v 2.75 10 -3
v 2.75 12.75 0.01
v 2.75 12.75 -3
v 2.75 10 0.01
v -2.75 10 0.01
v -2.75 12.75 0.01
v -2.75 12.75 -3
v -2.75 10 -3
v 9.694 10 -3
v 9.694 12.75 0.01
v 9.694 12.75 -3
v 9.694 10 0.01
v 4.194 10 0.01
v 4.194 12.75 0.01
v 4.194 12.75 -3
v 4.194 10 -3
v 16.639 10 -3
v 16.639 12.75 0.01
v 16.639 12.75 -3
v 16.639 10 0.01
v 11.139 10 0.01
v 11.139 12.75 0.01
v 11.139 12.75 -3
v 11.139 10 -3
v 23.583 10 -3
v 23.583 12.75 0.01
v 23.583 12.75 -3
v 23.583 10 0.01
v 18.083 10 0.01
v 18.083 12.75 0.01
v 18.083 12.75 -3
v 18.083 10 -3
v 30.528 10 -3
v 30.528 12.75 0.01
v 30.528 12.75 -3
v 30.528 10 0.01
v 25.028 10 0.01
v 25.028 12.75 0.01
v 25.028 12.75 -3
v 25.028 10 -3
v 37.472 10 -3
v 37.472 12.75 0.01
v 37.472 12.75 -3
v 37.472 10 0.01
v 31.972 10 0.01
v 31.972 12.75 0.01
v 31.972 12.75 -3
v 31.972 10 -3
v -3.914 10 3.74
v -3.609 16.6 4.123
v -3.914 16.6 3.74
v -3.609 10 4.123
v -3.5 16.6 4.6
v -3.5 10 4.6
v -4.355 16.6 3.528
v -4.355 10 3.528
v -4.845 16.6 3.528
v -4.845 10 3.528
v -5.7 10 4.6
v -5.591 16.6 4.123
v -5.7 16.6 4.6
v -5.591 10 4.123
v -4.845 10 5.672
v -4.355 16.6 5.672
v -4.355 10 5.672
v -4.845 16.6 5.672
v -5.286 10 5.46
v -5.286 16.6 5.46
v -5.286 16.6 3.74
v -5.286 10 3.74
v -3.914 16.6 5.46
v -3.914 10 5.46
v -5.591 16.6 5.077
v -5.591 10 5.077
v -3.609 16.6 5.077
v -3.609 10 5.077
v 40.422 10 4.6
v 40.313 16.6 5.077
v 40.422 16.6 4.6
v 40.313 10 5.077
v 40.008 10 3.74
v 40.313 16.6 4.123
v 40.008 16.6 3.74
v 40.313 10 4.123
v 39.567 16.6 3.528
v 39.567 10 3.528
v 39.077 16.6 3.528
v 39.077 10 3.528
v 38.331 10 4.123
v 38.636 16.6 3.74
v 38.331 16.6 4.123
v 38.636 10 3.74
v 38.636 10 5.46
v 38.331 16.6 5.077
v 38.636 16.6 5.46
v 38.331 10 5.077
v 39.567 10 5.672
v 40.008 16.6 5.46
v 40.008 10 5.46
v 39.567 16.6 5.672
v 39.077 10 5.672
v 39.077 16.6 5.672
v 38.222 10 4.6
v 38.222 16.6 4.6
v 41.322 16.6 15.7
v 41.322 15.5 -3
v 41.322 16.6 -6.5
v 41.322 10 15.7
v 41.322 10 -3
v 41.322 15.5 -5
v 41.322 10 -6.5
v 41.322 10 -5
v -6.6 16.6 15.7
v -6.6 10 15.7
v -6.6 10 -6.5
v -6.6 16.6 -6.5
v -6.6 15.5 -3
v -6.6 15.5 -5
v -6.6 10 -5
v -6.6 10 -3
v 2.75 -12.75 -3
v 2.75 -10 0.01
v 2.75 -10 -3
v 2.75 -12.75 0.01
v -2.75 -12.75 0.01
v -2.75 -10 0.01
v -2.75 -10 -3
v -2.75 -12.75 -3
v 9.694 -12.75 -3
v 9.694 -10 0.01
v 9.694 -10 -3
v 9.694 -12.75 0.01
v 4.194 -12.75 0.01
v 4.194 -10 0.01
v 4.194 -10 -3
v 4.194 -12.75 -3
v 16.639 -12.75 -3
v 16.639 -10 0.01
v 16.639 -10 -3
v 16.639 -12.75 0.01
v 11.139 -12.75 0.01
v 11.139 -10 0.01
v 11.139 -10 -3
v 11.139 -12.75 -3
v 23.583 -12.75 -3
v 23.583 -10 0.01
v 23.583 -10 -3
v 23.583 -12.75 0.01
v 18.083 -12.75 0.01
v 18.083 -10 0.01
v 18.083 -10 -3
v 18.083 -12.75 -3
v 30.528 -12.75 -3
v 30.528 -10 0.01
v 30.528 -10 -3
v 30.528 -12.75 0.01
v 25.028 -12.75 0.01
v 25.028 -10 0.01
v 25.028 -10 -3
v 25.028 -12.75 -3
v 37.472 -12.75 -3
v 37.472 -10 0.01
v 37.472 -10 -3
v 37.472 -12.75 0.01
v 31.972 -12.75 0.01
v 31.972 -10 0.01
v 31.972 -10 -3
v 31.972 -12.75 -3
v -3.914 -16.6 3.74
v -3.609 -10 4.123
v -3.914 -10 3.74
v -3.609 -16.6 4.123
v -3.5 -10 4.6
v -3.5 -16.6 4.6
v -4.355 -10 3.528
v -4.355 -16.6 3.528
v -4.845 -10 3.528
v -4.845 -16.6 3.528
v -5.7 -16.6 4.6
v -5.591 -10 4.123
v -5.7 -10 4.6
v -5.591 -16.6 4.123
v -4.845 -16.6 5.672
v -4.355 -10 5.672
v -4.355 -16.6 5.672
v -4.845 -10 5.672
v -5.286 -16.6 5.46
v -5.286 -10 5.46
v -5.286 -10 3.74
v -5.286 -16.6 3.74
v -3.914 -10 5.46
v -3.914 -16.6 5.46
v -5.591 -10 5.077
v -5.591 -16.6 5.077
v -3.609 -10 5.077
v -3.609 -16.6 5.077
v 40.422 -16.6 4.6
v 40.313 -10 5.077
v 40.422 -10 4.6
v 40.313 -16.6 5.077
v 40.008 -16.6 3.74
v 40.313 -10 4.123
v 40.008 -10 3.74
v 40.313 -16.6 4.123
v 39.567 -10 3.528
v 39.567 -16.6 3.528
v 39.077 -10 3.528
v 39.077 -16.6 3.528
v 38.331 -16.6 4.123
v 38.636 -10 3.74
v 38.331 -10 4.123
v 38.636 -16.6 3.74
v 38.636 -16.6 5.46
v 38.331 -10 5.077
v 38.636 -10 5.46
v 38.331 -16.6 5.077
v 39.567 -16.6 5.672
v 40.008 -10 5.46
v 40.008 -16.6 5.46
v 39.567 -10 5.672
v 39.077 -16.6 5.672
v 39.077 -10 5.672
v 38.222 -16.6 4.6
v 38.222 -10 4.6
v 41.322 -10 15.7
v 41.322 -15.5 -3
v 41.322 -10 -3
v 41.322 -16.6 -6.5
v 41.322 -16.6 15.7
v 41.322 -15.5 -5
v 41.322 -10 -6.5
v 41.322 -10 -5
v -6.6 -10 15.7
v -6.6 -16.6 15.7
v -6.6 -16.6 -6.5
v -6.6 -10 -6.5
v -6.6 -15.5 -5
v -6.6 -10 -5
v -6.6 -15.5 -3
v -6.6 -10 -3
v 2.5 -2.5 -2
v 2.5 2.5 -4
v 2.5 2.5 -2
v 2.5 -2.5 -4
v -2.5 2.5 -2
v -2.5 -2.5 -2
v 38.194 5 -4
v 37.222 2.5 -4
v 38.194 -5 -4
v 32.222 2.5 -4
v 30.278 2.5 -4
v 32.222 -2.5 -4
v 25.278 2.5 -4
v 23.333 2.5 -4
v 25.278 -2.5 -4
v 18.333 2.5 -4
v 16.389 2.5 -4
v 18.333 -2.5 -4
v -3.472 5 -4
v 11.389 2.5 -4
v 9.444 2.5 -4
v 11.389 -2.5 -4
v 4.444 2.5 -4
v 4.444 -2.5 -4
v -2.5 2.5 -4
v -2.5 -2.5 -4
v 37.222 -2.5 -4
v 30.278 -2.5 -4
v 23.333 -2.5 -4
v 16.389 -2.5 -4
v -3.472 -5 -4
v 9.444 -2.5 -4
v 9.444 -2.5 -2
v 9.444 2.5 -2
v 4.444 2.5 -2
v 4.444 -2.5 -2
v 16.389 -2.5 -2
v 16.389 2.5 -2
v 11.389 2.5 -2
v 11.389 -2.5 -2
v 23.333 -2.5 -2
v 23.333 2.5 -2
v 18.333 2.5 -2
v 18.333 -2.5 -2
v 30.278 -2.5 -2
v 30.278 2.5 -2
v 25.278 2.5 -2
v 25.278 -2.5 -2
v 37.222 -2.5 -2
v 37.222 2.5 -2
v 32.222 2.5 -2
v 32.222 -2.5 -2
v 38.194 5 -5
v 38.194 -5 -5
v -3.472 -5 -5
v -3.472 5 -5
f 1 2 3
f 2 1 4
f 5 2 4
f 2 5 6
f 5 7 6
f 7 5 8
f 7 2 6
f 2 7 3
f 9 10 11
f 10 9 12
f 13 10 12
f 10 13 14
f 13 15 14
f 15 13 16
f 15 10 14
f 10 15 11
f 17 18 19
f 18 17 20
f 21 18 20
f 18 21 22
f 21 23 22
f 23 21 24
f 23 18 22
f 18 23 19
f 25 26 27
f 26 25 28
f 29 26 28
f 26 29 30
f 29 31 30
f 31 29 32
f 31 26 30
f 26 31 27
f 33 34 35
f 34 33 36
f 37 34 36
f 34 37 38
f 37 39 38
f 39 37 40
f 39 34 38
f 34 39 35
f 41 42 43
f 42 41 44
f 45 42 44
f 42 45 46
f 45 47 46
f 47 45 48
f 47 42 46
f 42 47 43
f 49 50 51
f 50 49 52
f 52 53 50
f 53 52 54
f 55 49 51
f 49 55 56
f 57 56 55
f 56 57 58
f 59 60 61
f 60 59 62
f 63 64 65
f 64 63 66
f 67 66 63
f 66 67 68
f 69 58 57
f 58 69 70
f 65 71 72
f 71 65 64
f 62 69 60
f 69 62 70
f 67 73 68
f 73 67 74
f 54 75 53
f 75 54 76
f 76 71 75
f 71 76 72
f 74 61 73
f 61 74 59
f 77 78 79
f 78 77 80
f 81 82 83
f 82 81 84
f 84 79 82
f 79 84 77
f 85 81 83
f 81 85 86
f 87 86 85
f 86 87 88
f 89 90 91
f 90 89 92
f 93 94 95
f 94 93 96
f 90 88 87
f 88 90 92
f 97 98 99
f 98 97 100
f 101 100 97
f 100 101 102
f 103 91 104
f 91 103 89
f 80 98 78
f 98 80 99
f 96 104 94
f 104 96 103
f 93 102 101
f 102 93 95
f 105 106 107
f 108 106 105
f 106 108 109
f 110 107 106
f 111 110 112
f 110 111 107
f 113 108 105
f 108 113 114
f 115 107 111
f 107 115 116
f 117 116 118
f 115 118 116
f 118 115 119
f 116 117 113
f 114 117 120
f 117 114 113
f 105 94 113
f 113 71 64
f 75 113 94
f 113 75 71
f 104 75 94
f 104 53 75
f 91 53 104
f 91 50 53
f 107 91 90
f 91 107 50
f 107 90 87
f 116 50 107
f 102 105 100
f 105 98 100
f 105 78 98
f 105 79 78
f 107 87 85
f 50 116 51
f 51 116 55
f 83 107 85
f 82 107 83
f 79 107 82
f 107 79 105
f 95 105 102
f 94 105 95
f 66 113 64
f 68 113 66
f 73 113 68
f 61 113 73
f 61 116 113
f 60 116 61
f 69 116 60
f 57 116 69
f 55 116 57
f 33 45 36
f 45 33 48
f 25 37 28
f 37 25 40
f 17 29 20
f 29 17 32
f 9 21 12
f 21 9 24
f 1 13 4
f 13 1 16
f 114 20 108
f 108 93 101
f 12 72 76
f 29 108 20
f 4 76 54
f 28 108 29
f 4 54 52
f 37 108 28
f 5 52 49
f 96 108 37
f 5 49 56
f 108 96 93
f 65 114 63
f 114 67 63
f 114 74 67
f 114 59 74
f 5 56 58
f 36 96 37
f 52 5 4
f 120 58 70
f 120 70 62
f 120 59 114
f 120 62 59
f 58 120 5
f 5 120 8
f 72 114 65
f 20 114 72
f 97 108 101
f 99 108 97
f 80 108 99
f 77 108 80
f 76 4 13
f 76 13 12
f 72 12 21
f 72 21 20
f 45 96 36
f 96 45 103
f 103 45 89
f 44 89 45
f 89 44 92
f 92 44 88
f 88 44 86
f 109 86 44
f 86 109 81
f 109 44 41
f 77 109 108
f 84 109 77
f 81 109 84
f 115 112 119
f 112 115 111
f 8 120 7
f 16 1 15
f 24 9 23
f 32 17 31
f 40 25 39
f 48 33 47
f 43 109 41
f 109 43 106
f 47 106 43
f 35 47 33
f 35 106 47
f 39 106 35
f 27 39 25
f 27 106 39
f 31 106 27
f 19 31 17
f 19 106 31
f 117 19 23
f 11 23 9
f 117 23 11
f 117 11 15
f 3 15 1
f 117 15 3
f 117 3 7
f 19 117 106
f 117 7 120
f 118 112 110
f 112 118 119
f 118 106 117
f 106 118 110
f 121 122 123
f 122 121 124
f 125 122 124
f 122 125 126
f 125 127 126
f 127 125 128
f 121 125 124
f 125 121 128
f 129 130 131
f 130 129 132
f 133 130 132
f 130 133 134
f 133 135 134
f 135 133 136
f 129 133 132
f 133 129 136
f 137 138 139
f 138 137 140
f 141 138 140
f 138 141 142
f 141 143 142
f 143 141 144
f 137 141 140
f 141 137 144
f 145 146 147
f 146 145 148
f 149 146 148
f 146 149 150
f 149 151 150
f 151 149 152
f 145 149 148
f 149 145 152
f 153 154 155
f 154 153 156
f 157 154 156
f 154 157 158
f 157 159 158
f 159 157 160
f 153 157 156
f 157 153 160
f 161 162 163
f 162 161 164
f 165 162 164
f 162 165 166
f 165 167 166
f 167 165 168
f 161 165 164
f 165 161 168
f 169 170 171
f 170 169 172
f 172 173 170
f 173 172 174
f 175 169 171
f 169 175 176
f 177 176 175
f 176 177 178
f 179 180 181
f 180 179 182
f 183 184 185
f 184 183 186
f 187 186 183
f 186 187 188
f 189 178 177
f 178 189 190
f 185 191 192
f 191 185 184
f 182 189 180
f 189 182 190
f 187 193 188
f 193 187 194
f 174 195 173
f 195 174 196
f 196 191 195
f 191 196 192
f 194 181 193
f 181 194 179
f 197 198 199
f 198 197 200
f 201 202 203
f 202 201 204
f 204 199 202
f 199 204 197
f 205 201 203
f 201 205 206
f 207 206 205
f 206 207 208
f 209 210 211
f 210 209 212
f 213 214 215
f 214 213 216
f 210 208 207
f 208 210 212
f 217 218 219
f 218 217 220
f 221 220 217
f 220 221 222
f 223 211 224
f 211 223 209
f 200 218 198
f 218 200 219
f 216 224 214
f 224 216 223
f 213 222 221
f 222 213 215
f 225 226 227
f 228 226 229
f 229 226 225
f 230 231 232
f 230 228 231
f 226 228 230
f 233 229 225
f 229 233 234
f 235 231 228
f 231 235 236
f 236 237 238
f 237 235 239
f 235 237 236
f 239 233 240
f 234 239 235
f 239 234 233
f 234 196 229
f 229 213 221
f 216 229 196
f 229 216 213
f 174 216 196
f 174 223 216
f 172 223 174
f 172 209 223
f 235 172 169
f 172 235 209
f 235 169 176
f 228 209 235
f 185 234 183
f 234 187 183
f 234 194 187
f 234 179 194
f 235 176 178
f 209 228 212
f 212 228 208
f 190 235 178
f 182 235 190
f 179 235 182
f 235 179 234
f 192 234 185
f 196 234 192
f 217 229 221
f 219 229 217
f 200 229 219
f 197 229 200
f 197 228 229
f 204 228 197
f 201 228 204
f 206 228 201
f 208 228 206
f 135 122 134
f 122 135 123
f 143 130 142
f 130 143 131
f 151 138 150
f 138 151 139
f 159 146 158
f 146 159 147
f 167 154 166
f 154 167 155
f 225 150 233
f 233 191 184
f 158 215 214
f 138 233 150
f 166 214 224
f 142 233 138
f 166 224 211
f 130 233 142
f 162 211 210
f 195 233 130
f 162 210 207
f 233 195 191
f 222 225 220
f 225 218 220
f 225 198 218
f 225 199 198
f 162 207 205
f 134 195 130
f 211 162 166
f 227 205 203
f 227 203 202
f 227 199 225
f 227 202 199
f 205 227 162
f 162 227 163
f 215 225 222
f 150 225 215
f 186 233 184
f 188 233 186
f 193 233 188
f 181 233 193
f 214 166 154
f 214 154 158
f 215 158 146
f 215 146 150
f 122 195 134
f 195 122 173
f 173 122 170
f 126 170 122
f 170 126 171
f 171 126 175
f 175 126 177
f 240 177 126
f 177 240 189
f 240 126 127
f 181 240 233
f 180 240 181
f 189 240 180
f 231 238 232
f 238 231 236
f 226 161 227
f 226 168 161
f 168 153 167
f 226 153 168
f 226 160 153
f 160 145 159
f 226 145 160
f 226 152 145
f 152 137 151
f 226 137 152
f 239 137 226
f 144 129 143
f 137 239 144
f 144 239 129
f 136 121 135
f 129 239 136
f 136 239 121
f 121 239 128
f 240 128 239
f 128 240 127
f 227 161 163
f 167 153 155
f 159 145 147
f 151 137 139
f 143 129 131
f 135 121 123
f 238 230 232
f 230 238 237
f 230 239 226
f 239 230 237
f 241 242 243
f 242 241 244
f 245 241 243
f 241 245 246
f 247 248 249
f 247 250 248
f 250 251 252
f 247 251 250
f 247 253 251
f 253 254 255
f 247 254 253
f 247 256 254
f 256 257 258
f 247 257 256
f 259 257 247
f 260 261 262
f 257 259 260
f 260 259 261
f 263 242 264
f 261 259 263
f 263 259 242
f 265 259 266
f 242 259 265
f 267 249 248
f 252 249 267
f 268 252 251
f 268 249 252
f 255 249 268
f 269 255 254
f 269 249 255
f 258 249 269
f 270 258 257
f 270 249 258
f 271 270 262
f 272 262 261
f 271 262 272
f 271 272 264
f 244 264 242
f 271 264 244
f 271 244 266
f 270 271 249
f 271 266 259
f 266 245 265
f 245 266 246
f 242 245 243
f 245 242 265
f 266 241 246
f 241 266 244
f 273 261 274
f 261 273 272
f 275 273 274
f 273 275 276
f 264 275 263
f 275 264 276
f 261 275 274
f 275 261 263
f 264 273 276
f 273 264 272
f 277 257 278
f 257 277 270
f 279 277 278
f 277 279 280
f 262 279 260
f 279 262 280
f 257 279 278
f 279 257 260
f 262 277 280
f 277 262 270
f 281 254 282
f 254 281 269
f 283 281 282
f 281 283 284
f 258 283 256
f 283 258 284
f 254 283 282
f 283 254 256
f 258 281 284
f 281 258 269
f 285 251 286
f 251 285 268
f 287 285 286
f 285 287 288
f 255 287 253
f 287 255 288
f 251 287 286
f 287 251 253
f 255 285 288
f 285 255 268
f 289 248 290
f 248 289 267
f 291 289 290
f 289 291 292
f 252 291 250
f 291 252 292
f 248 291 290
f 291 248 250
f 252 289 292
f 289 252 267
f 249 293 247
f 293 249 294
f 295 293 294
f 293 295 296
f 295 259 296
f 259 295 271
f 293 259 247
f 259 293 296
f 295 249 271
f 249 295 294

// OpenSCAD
// file: rgb_strip_to_fiber.scad
led_size = 5;
led_strip_width = 10;
led_strip_thickness = 2;

ferrule_dia = 6;
ferrule_depth = 12;
ferrule_insulation_dia = 10;
ferrule_insulation_height = 10;
ferrule_lip = [0.5, 1]; // ferrule wall thickness is 0.2

registration_block_size = [10, 10, 14];
registration_block_lip = 2;
led_register_lip = 4;
block_to_led = 5;

part_spacing = 0.2;
wall_thickness = 1.5;

m2_hole_size = 2.2;
m3_hole_size = 3.3;


$fa=0.5;
$fs=0.5;

ferrules = [
  [2.5, 8, "1"],
  [3.4, 12, "2-3"],
  [4, 12, "4-5"],
  [4.7, 12, "6-7"]
];


smidge = 0.01;

module mockup(count, leds_per_meter=60, holes="inner", explode=0, half=false, blocks=true) {
  led_stride = 1000/leds_per_meter;

  translate([0, explode * 10, 0])
    strip_base(count, leds_per_meter, holes=holes, blocks=blocks);
  if (!half)
    translate([0, explode * -10, 0])
      mirror([0, 1, 0])
        strip_base(count, leds_per_meter, holes=holes, blocks=blocks);

    translate([0, 0, -block_to_led])
      led_strip(count, leds_per_meter);

  if (blocks) {
        translate([0 * led_stride, 0, 0])
          for (x = [0, half ? 0 : 1])
            rotate([0, 0, 90 + 180 * x])
              translate([0, max(0, explode * 5 - 2.5), 0])
                registration_block_awg_10(registration_block_size);

        translate([1 * led_stride, 0, 0])
          for (x = [0, half ? 0 : 1])
            rotate([0, 0, 90 + 180 * x])
              translate([0, max(0, explode * 5 - 2.5), 0])
                registration_block_awg_12(registration_block_size);

        translate([2 * led_stride, 0, 0])
          for (x = [0, half ? 0 : 1])
            rotate([0, 0, 90 + 180 * x])
              translate([0, max(0, explode * 5 - 2.5), 0])
                registration_block_awg_14(registration_block_size);
  }
}

module strip_base_with_fiber_cutouts(count, leds_per_meter=60, ferrule=0) {
  led_stride = 1000/leds_per_meter;

  difference() {
    strip_base(count, leds_per_meter=leds_per_meter, holes="outer", blocks=false);
    for (i = [0 : count - 1])
      translate([i * led_stride, 0, 0])
        ferrule_cutout(20, ferrule[0], ferrule[1]);
  }
}

module strip_base(count, leds_per_meter=60, holes="inner", blocks=true) {
  led_stride = 1000/leds_per_meter;
  registration_block_cutout = [registration_block_size.y + part_spacing,
                               registration_block_size.x + part_spacing,
                               registration_block_size.z + part_spacing];
  side_inset = 10;
  led_strip_cutout = led_strip_width + 1;

  housing_size = [(count -1) * led_stride + registration_block_cutout.x + wall_thickness * 2,
                  registration_block_cutout.y/2 + wall_thickness,
                  registration_block_cutout.z + wall_thickness * 2 + block_to_led];

  led_cutout = 5.5;
  fiber_cutout = registration_block_size.x - registration_block_lip;

  difference() {
    translate([-registration_block_cutout.x/2 - wall_thickness,
               0,
               -wall_thickness - block_to_led])
      cube(housing_size);

    for (i = [0 : count - 1])
      translate([i * led_stride, 0, 0]) {
        if (blocks) {
          registration_block_base(registration_block_cutout);
          translate([-fiber_cutout/2,
                     -fiber_cutout/2,
                     registration_block_cutout.z - smidge])
            cube([fiber_cutout, fiber_cutout, wall_thickness + smidge * 2]);
        }
        translate([-led_cutout/2,-led_cutout/2, -block_to_led + smidge])
          cube([led_cutout, led_cutout, block_to_led]);
      }

    translate([-registration_block_cutout.x/2 - wall_thickness - smidge,
               -led_strip_cutout/2,
               -block_to_led -0])
      cube([housing_size.x + smidge * 2, led_strip_cutout, led_strip_thickness]);

    if (holes == "inner")
      for (i = [0 : count - 2])
        translate([i * led_stride + led_stride/2,
                   -smidge,
                   registration_block_cutout.z/2]) {
          rotate([-90, 0, 0])
            cylinder(d=m3_hole_size, h=housing_size.y + smidge * 2);
        }
    if (holes == "outer")
      translate([-registration_block_cutout.x/2 - wall_thickness,
                 0,
                 -wall_thickness - block_to_led + housing_size.z/2])
      for (x = [2, housing_size.x - 2])
        translate([x, -smidge, 0])
            rotate([-90, 0, 0])
              cylinder(d=m2_hole_size, h=housing_size.y + smidge * 2);

  }
}


// max 1 1mm fibers
module registration_block_awg_18(block_size=registration_block_size) {
  block = ferrules[0];
  registration_block(block_size, block[0], block[1], block[2]);
}

// max 3 1mm fibers
module registration_block_awg_14(block_size=registration_block_size) {
  block = ferrules[1];
  registration_block(block_size, block[0], block[1], block[2]);
}

// max 5 1mm fibers
module registration_block_awg_12(block_size=registration_block_size) {
  block = ferrules[2];
  registration_block(block_size, block[0], block[1], block[2]);
}

// max 7 1mm fibers
module registration_block_awg_10(block_size=registration_block_size) {
  block = ferrules[3];
  registration_block(block_size, block[0], block[1], block[2]);
}

module ferrule_cutout(height, ferrule_dia, ferrule_length) {
  translate([0, 0, -smidge]) {
    cylinder(d=ferrule_dia - ferrule_lip.x, h=height + smidge * 2);
    translate([0, 0, ferrule_lip.y])
      cylinder(d=ferrule_dia, h=ferrule_length + smidge);
  }
}

module registration_block(block_size, ferrule_dia, ferrule_length, label) {
  label_depth = 0.30;

  difference() {
    intersection() {
      registration_block_base(block_size);
      translate([-block_size.x/2, 0])
        cube(block_size);
    }

    ferrule_cutout(block_size.z, ferrule_dia, ferrule_length);
    translate([0, block_size.y/2 - label_depth + smidge, block_size.z/2])
      rotate([-90, 90, 0])
        linear_extrude(height=label_depth)
          text(text=label, size=5, valign="center", halign="center");
  }
}

module registration_block_base(size) {
  translate([-size.x/2, -size.y/2])
    cube(size);
}

module ferrule_insulated() {
  taper_height = 2;

  translate([0, 0, -ferrule_depth])
    cylinder(d=ferrule_dia, h=ferrule_depth);

  translate([0, 0, taper_height])
    cylinder(d=ferrule_insulation_dia, h=ferrule_insulation_height-taper_height);
  cylinder(d1=ferrule_dia, d2=ferrule_insulation_dia, h=taper_height);

}

module led_strip(count, leds_per_meter) {
  led_stride = 1000/leds_per_meter;
  translate([0, 0, 1]) {
  color("#fefefe")
  for (i = [0 : count - 1])
    translate([i * led_stride, 0, 0]) {
      translate([-led_size/2, -led_size/2, 0])
        cube([led_size, led_size, 2]);
    }

  color("#fcfcfc")
  translate([-led_stride/2, -led_strip_width/2, -1])
  cube([led_stride * count, led_strip_width, 1]);
  }
}
// main file
use <rgb_strip_to_fiber.scad>

mockup(6, leds_per_meter=144, holes="outer", half=false, explode=1, blocks=false);
